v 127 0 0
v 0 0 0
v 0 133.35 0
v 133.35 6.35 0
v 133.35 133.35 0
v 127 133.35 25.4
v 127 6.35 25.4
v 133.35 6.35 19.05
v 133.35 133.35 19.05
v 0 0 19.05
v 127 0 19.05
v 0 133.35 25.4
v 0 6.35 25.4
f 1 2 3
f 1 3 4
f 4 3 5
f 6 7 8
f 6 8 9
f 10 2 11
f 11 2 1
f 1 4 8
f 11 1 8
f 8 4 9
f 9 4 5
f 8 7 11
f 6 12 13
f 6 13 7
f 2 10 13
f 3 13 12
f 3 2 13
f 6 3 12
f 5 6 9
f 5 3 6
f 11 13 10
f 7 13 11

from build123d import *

# Parameters (mm, degrees)
F0_W     = 133.35
F0_H     = 133.35
F1_DEPTH = 25.4
F2_SIZE  = 6.35


with BuildPart() as f1:
    # F0 (on Top) → F1 (new body)
    with BuildSketch(Plane.XY):
        with Locations((66.675, 66.675)):
            Rectangle(F0_W, F0_H)
    extrude(amount=F1_DEPTH)

    # F2
    f2_edges = [f1.edges().sort_by_distance(p)[0] for p in [
        (66.675, 0, 25.4),
        (133.35, 66.675, 25.4),
        (133.35, 0, 12.7),
    ]]
    chamfer(f2_edges, length=F2_SIZE)


solid = f1.part
